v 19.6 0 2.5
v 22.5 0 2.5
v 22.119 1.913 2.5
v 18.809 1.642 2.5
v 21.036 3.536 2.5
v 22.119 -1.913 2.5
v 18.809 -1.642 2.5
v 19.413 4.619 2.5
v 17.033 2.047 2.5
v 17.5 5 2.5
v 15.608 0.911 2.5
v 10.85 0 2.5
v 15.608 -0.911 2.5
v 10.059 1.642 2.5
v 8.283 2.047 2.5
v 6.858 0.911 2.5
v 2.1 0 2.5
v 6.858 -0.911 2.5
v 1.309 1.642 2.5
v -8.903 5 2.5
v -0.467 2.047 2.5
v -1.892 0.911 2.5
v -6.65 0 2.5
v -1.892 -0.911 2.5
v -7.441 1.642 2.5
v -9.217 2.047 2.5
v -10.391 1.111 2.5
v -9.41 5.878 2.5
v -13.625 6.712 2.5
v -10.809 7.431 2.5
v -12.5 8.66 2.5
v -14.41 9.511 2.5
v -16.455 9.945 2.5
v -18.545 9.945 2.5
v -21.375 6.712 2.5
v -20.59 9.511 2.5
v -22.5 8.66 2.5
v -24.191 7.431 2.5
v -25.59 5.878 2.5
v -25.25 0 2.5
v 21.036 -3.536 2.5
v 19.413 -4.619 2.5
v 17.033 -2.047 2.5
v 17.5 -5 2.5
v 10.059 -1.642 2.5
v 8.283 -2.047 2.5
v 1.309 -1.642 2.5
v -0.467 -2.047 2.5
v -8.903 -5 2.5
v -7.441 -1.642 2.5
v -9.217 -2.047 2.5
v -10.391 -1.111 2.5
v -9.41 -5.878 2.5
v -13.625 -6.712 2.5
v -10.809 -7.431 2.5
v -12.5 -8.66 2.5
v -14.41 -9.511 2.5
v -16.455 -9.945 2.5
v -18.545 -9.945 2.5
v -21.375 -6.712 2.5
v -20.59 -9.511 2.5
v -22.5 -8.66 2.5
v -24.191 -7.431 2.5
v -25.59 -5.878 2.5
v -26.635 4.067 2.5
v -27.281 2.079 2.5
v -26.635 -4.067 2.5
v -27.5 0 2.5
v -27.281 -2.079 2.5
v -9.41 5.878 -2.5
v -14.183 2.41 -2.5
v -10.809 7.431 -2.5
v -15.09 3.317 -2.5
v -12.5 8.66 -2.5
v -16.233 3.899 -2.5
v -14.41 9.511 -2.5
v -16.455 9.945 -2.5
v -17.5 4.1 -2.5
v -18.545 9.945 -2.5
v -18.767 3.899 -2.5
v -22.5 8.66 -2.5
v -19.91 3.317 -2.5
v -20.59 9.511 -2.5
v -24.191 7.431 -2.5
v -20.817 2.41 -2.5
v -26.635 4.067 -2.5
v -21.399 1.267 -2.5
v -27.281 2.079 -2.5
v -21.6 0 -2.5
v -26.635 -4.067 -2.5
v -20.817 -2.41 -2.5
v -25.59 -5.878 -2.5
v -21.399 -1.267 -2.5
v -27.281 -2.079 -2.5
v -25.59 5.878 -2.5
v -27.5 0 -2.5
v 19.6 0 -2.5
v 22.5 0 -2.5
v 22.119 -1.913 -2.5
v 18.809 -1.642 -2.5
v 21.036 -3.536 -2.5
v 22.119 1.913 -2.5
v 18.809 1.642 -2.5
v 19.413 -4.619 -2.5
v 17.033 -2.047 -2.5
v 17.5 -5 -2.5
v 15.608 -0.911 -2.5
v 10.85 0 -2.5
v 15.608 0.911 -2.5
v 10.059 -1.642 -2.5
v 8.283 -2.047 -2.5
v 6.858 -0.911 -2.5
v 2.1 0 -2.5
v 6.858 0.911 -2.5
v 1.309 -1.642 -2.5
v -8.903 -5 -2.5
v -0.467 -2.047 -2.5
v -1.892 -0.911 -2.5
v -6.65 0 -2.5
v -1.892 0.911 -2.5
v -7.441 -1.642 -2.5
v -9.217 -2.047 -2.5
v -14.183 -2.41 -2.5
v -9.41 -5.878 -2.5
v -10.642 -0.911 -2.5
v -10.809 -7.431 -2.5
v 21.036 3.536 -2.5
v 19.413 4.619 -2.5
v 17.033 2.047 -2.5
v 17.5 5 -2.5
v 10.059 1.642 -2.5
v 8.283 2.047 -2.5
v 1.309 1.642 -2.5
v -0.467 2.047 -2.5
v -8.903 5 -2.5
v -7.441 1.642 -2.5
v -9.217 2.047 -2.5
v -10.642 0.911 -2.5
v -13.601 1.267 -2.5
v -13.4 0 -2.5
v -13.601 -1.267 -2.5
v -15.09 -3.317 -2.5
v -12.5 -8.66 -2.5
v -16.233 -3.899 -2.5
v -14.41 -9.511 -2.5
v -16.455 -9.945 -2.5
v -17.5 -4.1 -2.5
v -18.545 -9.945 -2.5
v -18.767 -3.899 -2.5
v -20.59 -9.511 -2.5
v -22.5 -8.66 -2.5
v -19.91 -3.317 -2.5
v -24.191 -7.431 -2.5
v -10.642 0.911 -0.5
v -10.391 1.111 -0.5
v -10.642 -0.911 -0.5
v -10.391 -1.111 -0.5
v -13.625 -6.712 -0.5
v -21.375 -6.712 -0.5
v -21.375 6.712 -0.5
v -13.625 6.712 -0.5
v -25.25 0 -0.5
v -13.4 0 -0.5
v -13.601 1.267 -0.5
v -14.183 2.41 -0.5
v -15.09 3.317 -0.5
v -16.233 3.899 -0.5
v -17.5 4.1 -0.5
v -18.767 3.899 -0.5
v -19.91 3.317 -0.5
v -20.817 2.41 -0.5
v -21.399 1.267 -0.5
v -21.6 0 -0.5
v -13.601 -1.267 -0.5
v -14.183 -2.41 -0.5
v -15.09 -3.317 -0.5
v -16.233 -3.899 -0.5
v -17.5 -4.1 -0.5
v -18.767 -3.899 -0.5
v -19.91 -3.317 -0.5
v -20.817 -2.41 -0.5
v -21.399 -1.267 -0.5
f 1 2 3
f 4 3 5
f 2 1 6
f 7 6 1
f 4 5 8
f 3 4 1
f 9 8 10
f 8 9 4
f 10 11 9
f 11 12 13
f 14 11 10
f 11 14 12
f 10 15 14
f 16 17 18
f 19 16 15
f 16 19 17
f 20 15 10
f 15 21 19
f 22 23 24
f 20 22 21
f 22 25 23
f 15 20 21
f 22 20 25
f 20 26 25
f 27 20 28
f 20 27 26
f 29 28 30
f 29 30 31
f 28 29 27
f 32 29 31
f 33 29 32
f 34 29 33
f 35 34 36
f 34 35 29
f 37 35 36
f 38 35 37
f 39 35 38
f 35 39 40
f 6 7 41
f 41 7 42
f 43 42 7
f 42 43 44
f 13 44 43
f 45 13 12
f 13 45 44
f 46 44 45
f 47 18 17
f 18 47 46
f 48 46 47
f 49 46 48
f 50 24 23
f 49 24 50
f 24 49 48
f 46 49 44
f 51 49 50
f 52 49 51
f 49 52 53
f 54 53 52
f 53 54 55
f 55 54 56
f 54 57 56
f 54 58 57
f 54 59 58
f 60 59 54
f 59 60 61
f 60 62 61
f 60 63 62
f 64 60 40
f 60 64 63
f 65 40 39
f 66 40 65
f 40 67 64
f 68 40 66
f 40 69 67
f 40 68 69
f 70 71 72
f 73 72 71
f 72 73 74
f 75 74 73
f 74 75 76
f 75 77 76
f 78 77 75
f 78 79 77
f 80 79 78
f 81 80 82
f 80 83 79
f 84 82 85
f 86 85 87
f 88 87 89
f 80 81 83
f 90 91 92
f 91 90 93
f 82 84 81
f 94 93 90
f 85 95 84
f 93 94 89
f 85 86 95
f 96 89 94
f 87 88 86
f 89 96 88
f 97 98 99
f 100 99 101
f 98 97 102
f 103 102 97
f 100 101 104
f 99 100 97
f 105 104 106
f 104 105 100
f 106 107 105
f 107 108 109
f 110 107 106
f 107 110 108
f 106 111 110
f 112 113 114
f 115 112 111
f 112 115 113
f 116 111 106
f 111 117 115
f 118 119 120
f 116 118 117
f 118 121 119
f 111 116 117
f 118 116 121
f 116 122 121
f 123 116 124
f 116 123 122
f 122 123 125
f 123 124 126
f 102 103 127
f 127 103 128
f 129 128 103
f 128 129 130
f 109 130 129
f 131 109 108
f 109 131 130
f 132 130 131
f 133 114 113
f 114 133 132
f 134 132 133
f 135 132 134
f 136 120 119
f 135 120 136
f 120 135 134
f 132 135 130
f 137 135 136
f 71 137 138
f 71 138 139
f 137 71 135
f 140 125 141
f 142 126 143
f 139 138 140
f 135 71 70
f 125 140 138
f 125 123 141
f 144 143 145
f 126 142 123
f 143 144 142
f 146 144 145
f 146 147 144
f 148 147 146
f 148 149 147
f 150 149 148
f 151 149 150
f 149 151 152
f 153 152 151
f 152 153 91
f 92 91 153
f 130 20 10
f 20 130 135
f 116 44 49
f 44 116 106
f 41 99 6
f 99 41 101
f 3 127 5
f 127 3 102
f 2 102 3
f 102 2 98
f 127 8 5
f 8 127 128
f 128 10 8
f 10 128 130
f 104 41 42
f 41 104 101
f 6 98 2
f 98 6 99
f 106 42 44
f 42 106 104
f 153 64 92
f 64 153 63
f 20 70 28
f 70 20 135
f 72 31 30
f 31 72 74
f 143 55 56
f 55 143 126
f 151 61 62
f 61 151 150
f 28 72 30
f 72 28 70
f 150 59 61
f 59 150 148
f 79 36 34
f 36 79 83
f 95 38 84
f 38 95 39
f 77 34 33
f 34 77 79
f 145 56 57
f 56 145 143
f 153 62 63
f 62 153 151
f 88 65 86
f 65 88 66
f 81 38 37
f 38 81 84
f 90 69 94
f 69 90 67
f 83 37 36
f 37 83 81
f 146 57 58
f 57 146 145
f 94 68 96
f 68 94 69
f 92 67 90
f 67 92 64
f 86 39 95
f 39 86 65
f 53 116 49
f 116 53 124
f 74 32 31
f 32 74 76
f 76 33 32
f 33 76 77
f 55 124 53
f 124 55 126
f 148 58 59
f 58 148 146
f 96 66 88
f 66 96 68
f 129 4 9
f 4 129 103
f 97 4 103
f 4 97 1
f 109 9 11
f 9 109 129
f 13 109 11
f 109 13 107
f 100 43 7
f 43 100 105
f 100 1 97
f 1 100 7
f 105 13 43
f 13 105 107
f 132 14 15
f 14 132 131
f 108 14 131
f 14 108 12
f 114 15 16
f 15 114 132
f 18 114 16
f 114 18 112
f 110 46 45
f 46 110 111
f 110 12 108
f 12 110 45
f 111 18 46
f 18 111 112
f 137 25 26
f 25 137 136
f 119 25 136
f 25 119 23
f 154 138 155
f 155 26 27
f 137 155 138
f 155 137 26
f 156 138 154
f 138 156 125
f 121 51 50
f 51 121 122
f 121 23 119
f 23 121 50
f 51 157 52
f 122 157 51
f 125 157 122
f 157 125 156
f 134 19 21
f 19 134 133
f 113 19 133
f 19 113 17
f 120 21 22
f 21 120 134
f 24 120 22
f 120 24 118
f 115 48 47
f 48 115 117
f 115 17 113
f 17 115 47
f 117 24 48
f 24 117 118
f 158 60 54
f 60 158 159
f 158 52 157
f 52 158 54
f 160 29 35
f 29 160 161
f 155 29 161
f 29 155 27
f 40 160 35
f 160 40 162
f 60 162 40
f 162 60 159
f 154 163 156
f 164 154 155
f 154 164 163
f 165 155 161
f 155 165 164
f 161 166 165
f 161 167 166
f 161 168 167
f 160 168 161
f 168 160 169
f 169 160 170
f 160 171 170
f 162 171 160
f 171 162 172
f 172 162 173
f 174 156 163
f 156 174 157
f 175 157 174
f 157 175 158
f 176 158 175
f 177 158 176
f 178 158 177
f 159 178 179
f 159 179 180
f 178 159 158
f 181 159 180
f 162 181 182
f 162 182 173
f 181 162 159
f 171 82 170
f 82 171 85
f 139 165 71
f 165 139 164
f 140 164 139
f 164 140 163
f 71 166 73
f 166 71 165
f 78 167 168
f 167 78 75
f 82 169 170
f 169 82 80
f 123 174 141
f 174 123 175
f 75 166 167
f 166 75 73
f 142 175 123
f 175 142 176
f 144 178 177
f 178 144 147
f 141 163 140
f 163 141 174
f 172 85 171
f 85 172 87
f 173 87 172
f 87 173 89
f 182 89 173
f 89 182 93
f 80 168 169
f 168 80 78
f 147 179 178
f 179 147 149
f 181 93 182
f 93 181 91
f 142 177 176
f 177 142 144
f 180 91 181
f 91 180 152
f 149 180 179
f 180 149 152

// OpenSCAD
espesor_pieza=5;
ancho_pieza=10;
longitud_tensor=50;
longitud_brazo=53;
longitud_brazo_suspension=50;


longitud_brazo_diagonal=sqrt(pow(longitud_brazo,2)+pow(longitud_brazo_suspension,2));
longitud_brazo_diagonal=35;

echo (longitud_brazo_diagonal);

//suspension();
brazo_diagonal();
module suspension(){
	difference(){
		union(){
			//brazo principal HORIZONTAL
			brazo_diagonal();
			
			
			translate([longitud_brazo_diagonal/2,,0])
			rotate([0,0,40])
			brazotensor();			
			
			//placa apoyo
			//translate([(-longitud_brazo+ancho_pieza*2.5)/2,-ancho_pieza*1.5,-2.5])
			//cube([20,20,5], center=true);
		}
		/*
		translate([(-longitud_brazo)/2,,0,])
			cube([20,longitud_brazo_suspension-ancho_pieza,40], center=true);
		translate([(longitud_brazo)/2,-longitud_brazo_suspension +(ancho_pieza/4),0])
			cube([20,longitud_brazo_suspension/2+ancho_pieza,40], center=true);
		
		translate([longitud_brazo_diagonal/2,0,3])
			rotate([0,0,45])
		cube([longitud_brazo_suspension-10,ancho_pieza-2 ,espesor_pieza],center=true);
		
		translate([longitud_brazo_diagonal/2,0,0])
		cylinder(r=8.2/2, h=espesor_pieza*3,$fn=20, center=true);
		*/
	}
}

module brazotensor(){
	difference(){
		union(){
			cube([longitud_tensor,ancho_pieza+2 ,espesor_pieza],center=true);
			translate([longitud_tensor/2,0,0])
			cylinder(r=ancho_pieza/2+1, h=espesor_pieza, center=true);
			translate([-longitud_tensor/2,0,0])
			cylinder(r=ancho_pieza/2+1, h=espesor_pieza, center=true);
		}
		translate([longitud_tensor/2,0,0])
		cylinder(r=4.2/2, h=20, center=true);
		translate([-longitud_tensor/2,0,0])
		cylinder(r=4.2/2, h=20, center=true);
		translate([longitud_tensor/4,0,0])
		cylinder(r=4.2/2, h=20, center=true);
		translate([-longitud_tensor/4,0,0])
		cylinder(r=4.2/2, h=20, center=true);
		cylinder(r=4.2/2, h=20, center=true);

		
	}


}



module brazo_diagonal(){
	difference(){
		union(){
			
			cube([longitud_brazo_diagonal,ancho_pieza ,espesor_pieza],center=true);
			translate([longitud_brazo_diagonal/2,0,0])
			cylinder(r=ancho_pieza/2, h=espesor_pieza, center=true);
			translate([-longitud_brazo_diagonal/2,0,0])
			cylinder(r=ancho_pieza/2, h=espesor_pieza, center=true);

			//redondeo alojamiento tuerca
			translate([-longitud_brazo_diagonal/2,0,0])
			cylinder(r=20/2, h=espesor_pieza, center=true);
			/*
			//redondeo alojamiento muelle
			translate([longitud_brazo_diagonal/2,0,0])
			cylinder(r=20/2, h=espesor_pieza, center=true);
			*/
		}
		translate([longitud_brazo_diagonal/2,0,0])
		cylinder(r=4.2/2, h=20, center=true);
		translate([-longitud_brazo_diagonal/2,0,0])
		cylinder(r=4.2/2, h=20, center=true);
		translate([longitud_brazo_diagonal/4,0,0])
		cylinder(r=4.2/2, h=20, center=true);
		translate([-longitud_brazo_diagonal/4,0,0])
		cylinder(r=4.2/2, h=20, center=true);
		cylinder(r=4.2/2, h=20, center=true);

		//ALOJAMIENTO TUERCA
		/*bulbo
		translate([-longitud_brazo_diagonal/2,0,-espesor_pieza/2])
		cylinder(r=15.5/2, h=espesor_pieza*2-2,$fn=6);
		*/
		translate([-longitud_brazo_diagonal/2,0,-espesor_pieza/2+2])
		cylinder(r=15.5/2, h=espesor_pieza*2-2,$fn=6);
		//EJE TUERCA
		
		translate([-longitud_brazo_diagonal/2,0,0])
		cylinder(r=8.2/2, h=espesor_pieza*3,$fn=20, center=true);
	}

}


//brazotensor();
